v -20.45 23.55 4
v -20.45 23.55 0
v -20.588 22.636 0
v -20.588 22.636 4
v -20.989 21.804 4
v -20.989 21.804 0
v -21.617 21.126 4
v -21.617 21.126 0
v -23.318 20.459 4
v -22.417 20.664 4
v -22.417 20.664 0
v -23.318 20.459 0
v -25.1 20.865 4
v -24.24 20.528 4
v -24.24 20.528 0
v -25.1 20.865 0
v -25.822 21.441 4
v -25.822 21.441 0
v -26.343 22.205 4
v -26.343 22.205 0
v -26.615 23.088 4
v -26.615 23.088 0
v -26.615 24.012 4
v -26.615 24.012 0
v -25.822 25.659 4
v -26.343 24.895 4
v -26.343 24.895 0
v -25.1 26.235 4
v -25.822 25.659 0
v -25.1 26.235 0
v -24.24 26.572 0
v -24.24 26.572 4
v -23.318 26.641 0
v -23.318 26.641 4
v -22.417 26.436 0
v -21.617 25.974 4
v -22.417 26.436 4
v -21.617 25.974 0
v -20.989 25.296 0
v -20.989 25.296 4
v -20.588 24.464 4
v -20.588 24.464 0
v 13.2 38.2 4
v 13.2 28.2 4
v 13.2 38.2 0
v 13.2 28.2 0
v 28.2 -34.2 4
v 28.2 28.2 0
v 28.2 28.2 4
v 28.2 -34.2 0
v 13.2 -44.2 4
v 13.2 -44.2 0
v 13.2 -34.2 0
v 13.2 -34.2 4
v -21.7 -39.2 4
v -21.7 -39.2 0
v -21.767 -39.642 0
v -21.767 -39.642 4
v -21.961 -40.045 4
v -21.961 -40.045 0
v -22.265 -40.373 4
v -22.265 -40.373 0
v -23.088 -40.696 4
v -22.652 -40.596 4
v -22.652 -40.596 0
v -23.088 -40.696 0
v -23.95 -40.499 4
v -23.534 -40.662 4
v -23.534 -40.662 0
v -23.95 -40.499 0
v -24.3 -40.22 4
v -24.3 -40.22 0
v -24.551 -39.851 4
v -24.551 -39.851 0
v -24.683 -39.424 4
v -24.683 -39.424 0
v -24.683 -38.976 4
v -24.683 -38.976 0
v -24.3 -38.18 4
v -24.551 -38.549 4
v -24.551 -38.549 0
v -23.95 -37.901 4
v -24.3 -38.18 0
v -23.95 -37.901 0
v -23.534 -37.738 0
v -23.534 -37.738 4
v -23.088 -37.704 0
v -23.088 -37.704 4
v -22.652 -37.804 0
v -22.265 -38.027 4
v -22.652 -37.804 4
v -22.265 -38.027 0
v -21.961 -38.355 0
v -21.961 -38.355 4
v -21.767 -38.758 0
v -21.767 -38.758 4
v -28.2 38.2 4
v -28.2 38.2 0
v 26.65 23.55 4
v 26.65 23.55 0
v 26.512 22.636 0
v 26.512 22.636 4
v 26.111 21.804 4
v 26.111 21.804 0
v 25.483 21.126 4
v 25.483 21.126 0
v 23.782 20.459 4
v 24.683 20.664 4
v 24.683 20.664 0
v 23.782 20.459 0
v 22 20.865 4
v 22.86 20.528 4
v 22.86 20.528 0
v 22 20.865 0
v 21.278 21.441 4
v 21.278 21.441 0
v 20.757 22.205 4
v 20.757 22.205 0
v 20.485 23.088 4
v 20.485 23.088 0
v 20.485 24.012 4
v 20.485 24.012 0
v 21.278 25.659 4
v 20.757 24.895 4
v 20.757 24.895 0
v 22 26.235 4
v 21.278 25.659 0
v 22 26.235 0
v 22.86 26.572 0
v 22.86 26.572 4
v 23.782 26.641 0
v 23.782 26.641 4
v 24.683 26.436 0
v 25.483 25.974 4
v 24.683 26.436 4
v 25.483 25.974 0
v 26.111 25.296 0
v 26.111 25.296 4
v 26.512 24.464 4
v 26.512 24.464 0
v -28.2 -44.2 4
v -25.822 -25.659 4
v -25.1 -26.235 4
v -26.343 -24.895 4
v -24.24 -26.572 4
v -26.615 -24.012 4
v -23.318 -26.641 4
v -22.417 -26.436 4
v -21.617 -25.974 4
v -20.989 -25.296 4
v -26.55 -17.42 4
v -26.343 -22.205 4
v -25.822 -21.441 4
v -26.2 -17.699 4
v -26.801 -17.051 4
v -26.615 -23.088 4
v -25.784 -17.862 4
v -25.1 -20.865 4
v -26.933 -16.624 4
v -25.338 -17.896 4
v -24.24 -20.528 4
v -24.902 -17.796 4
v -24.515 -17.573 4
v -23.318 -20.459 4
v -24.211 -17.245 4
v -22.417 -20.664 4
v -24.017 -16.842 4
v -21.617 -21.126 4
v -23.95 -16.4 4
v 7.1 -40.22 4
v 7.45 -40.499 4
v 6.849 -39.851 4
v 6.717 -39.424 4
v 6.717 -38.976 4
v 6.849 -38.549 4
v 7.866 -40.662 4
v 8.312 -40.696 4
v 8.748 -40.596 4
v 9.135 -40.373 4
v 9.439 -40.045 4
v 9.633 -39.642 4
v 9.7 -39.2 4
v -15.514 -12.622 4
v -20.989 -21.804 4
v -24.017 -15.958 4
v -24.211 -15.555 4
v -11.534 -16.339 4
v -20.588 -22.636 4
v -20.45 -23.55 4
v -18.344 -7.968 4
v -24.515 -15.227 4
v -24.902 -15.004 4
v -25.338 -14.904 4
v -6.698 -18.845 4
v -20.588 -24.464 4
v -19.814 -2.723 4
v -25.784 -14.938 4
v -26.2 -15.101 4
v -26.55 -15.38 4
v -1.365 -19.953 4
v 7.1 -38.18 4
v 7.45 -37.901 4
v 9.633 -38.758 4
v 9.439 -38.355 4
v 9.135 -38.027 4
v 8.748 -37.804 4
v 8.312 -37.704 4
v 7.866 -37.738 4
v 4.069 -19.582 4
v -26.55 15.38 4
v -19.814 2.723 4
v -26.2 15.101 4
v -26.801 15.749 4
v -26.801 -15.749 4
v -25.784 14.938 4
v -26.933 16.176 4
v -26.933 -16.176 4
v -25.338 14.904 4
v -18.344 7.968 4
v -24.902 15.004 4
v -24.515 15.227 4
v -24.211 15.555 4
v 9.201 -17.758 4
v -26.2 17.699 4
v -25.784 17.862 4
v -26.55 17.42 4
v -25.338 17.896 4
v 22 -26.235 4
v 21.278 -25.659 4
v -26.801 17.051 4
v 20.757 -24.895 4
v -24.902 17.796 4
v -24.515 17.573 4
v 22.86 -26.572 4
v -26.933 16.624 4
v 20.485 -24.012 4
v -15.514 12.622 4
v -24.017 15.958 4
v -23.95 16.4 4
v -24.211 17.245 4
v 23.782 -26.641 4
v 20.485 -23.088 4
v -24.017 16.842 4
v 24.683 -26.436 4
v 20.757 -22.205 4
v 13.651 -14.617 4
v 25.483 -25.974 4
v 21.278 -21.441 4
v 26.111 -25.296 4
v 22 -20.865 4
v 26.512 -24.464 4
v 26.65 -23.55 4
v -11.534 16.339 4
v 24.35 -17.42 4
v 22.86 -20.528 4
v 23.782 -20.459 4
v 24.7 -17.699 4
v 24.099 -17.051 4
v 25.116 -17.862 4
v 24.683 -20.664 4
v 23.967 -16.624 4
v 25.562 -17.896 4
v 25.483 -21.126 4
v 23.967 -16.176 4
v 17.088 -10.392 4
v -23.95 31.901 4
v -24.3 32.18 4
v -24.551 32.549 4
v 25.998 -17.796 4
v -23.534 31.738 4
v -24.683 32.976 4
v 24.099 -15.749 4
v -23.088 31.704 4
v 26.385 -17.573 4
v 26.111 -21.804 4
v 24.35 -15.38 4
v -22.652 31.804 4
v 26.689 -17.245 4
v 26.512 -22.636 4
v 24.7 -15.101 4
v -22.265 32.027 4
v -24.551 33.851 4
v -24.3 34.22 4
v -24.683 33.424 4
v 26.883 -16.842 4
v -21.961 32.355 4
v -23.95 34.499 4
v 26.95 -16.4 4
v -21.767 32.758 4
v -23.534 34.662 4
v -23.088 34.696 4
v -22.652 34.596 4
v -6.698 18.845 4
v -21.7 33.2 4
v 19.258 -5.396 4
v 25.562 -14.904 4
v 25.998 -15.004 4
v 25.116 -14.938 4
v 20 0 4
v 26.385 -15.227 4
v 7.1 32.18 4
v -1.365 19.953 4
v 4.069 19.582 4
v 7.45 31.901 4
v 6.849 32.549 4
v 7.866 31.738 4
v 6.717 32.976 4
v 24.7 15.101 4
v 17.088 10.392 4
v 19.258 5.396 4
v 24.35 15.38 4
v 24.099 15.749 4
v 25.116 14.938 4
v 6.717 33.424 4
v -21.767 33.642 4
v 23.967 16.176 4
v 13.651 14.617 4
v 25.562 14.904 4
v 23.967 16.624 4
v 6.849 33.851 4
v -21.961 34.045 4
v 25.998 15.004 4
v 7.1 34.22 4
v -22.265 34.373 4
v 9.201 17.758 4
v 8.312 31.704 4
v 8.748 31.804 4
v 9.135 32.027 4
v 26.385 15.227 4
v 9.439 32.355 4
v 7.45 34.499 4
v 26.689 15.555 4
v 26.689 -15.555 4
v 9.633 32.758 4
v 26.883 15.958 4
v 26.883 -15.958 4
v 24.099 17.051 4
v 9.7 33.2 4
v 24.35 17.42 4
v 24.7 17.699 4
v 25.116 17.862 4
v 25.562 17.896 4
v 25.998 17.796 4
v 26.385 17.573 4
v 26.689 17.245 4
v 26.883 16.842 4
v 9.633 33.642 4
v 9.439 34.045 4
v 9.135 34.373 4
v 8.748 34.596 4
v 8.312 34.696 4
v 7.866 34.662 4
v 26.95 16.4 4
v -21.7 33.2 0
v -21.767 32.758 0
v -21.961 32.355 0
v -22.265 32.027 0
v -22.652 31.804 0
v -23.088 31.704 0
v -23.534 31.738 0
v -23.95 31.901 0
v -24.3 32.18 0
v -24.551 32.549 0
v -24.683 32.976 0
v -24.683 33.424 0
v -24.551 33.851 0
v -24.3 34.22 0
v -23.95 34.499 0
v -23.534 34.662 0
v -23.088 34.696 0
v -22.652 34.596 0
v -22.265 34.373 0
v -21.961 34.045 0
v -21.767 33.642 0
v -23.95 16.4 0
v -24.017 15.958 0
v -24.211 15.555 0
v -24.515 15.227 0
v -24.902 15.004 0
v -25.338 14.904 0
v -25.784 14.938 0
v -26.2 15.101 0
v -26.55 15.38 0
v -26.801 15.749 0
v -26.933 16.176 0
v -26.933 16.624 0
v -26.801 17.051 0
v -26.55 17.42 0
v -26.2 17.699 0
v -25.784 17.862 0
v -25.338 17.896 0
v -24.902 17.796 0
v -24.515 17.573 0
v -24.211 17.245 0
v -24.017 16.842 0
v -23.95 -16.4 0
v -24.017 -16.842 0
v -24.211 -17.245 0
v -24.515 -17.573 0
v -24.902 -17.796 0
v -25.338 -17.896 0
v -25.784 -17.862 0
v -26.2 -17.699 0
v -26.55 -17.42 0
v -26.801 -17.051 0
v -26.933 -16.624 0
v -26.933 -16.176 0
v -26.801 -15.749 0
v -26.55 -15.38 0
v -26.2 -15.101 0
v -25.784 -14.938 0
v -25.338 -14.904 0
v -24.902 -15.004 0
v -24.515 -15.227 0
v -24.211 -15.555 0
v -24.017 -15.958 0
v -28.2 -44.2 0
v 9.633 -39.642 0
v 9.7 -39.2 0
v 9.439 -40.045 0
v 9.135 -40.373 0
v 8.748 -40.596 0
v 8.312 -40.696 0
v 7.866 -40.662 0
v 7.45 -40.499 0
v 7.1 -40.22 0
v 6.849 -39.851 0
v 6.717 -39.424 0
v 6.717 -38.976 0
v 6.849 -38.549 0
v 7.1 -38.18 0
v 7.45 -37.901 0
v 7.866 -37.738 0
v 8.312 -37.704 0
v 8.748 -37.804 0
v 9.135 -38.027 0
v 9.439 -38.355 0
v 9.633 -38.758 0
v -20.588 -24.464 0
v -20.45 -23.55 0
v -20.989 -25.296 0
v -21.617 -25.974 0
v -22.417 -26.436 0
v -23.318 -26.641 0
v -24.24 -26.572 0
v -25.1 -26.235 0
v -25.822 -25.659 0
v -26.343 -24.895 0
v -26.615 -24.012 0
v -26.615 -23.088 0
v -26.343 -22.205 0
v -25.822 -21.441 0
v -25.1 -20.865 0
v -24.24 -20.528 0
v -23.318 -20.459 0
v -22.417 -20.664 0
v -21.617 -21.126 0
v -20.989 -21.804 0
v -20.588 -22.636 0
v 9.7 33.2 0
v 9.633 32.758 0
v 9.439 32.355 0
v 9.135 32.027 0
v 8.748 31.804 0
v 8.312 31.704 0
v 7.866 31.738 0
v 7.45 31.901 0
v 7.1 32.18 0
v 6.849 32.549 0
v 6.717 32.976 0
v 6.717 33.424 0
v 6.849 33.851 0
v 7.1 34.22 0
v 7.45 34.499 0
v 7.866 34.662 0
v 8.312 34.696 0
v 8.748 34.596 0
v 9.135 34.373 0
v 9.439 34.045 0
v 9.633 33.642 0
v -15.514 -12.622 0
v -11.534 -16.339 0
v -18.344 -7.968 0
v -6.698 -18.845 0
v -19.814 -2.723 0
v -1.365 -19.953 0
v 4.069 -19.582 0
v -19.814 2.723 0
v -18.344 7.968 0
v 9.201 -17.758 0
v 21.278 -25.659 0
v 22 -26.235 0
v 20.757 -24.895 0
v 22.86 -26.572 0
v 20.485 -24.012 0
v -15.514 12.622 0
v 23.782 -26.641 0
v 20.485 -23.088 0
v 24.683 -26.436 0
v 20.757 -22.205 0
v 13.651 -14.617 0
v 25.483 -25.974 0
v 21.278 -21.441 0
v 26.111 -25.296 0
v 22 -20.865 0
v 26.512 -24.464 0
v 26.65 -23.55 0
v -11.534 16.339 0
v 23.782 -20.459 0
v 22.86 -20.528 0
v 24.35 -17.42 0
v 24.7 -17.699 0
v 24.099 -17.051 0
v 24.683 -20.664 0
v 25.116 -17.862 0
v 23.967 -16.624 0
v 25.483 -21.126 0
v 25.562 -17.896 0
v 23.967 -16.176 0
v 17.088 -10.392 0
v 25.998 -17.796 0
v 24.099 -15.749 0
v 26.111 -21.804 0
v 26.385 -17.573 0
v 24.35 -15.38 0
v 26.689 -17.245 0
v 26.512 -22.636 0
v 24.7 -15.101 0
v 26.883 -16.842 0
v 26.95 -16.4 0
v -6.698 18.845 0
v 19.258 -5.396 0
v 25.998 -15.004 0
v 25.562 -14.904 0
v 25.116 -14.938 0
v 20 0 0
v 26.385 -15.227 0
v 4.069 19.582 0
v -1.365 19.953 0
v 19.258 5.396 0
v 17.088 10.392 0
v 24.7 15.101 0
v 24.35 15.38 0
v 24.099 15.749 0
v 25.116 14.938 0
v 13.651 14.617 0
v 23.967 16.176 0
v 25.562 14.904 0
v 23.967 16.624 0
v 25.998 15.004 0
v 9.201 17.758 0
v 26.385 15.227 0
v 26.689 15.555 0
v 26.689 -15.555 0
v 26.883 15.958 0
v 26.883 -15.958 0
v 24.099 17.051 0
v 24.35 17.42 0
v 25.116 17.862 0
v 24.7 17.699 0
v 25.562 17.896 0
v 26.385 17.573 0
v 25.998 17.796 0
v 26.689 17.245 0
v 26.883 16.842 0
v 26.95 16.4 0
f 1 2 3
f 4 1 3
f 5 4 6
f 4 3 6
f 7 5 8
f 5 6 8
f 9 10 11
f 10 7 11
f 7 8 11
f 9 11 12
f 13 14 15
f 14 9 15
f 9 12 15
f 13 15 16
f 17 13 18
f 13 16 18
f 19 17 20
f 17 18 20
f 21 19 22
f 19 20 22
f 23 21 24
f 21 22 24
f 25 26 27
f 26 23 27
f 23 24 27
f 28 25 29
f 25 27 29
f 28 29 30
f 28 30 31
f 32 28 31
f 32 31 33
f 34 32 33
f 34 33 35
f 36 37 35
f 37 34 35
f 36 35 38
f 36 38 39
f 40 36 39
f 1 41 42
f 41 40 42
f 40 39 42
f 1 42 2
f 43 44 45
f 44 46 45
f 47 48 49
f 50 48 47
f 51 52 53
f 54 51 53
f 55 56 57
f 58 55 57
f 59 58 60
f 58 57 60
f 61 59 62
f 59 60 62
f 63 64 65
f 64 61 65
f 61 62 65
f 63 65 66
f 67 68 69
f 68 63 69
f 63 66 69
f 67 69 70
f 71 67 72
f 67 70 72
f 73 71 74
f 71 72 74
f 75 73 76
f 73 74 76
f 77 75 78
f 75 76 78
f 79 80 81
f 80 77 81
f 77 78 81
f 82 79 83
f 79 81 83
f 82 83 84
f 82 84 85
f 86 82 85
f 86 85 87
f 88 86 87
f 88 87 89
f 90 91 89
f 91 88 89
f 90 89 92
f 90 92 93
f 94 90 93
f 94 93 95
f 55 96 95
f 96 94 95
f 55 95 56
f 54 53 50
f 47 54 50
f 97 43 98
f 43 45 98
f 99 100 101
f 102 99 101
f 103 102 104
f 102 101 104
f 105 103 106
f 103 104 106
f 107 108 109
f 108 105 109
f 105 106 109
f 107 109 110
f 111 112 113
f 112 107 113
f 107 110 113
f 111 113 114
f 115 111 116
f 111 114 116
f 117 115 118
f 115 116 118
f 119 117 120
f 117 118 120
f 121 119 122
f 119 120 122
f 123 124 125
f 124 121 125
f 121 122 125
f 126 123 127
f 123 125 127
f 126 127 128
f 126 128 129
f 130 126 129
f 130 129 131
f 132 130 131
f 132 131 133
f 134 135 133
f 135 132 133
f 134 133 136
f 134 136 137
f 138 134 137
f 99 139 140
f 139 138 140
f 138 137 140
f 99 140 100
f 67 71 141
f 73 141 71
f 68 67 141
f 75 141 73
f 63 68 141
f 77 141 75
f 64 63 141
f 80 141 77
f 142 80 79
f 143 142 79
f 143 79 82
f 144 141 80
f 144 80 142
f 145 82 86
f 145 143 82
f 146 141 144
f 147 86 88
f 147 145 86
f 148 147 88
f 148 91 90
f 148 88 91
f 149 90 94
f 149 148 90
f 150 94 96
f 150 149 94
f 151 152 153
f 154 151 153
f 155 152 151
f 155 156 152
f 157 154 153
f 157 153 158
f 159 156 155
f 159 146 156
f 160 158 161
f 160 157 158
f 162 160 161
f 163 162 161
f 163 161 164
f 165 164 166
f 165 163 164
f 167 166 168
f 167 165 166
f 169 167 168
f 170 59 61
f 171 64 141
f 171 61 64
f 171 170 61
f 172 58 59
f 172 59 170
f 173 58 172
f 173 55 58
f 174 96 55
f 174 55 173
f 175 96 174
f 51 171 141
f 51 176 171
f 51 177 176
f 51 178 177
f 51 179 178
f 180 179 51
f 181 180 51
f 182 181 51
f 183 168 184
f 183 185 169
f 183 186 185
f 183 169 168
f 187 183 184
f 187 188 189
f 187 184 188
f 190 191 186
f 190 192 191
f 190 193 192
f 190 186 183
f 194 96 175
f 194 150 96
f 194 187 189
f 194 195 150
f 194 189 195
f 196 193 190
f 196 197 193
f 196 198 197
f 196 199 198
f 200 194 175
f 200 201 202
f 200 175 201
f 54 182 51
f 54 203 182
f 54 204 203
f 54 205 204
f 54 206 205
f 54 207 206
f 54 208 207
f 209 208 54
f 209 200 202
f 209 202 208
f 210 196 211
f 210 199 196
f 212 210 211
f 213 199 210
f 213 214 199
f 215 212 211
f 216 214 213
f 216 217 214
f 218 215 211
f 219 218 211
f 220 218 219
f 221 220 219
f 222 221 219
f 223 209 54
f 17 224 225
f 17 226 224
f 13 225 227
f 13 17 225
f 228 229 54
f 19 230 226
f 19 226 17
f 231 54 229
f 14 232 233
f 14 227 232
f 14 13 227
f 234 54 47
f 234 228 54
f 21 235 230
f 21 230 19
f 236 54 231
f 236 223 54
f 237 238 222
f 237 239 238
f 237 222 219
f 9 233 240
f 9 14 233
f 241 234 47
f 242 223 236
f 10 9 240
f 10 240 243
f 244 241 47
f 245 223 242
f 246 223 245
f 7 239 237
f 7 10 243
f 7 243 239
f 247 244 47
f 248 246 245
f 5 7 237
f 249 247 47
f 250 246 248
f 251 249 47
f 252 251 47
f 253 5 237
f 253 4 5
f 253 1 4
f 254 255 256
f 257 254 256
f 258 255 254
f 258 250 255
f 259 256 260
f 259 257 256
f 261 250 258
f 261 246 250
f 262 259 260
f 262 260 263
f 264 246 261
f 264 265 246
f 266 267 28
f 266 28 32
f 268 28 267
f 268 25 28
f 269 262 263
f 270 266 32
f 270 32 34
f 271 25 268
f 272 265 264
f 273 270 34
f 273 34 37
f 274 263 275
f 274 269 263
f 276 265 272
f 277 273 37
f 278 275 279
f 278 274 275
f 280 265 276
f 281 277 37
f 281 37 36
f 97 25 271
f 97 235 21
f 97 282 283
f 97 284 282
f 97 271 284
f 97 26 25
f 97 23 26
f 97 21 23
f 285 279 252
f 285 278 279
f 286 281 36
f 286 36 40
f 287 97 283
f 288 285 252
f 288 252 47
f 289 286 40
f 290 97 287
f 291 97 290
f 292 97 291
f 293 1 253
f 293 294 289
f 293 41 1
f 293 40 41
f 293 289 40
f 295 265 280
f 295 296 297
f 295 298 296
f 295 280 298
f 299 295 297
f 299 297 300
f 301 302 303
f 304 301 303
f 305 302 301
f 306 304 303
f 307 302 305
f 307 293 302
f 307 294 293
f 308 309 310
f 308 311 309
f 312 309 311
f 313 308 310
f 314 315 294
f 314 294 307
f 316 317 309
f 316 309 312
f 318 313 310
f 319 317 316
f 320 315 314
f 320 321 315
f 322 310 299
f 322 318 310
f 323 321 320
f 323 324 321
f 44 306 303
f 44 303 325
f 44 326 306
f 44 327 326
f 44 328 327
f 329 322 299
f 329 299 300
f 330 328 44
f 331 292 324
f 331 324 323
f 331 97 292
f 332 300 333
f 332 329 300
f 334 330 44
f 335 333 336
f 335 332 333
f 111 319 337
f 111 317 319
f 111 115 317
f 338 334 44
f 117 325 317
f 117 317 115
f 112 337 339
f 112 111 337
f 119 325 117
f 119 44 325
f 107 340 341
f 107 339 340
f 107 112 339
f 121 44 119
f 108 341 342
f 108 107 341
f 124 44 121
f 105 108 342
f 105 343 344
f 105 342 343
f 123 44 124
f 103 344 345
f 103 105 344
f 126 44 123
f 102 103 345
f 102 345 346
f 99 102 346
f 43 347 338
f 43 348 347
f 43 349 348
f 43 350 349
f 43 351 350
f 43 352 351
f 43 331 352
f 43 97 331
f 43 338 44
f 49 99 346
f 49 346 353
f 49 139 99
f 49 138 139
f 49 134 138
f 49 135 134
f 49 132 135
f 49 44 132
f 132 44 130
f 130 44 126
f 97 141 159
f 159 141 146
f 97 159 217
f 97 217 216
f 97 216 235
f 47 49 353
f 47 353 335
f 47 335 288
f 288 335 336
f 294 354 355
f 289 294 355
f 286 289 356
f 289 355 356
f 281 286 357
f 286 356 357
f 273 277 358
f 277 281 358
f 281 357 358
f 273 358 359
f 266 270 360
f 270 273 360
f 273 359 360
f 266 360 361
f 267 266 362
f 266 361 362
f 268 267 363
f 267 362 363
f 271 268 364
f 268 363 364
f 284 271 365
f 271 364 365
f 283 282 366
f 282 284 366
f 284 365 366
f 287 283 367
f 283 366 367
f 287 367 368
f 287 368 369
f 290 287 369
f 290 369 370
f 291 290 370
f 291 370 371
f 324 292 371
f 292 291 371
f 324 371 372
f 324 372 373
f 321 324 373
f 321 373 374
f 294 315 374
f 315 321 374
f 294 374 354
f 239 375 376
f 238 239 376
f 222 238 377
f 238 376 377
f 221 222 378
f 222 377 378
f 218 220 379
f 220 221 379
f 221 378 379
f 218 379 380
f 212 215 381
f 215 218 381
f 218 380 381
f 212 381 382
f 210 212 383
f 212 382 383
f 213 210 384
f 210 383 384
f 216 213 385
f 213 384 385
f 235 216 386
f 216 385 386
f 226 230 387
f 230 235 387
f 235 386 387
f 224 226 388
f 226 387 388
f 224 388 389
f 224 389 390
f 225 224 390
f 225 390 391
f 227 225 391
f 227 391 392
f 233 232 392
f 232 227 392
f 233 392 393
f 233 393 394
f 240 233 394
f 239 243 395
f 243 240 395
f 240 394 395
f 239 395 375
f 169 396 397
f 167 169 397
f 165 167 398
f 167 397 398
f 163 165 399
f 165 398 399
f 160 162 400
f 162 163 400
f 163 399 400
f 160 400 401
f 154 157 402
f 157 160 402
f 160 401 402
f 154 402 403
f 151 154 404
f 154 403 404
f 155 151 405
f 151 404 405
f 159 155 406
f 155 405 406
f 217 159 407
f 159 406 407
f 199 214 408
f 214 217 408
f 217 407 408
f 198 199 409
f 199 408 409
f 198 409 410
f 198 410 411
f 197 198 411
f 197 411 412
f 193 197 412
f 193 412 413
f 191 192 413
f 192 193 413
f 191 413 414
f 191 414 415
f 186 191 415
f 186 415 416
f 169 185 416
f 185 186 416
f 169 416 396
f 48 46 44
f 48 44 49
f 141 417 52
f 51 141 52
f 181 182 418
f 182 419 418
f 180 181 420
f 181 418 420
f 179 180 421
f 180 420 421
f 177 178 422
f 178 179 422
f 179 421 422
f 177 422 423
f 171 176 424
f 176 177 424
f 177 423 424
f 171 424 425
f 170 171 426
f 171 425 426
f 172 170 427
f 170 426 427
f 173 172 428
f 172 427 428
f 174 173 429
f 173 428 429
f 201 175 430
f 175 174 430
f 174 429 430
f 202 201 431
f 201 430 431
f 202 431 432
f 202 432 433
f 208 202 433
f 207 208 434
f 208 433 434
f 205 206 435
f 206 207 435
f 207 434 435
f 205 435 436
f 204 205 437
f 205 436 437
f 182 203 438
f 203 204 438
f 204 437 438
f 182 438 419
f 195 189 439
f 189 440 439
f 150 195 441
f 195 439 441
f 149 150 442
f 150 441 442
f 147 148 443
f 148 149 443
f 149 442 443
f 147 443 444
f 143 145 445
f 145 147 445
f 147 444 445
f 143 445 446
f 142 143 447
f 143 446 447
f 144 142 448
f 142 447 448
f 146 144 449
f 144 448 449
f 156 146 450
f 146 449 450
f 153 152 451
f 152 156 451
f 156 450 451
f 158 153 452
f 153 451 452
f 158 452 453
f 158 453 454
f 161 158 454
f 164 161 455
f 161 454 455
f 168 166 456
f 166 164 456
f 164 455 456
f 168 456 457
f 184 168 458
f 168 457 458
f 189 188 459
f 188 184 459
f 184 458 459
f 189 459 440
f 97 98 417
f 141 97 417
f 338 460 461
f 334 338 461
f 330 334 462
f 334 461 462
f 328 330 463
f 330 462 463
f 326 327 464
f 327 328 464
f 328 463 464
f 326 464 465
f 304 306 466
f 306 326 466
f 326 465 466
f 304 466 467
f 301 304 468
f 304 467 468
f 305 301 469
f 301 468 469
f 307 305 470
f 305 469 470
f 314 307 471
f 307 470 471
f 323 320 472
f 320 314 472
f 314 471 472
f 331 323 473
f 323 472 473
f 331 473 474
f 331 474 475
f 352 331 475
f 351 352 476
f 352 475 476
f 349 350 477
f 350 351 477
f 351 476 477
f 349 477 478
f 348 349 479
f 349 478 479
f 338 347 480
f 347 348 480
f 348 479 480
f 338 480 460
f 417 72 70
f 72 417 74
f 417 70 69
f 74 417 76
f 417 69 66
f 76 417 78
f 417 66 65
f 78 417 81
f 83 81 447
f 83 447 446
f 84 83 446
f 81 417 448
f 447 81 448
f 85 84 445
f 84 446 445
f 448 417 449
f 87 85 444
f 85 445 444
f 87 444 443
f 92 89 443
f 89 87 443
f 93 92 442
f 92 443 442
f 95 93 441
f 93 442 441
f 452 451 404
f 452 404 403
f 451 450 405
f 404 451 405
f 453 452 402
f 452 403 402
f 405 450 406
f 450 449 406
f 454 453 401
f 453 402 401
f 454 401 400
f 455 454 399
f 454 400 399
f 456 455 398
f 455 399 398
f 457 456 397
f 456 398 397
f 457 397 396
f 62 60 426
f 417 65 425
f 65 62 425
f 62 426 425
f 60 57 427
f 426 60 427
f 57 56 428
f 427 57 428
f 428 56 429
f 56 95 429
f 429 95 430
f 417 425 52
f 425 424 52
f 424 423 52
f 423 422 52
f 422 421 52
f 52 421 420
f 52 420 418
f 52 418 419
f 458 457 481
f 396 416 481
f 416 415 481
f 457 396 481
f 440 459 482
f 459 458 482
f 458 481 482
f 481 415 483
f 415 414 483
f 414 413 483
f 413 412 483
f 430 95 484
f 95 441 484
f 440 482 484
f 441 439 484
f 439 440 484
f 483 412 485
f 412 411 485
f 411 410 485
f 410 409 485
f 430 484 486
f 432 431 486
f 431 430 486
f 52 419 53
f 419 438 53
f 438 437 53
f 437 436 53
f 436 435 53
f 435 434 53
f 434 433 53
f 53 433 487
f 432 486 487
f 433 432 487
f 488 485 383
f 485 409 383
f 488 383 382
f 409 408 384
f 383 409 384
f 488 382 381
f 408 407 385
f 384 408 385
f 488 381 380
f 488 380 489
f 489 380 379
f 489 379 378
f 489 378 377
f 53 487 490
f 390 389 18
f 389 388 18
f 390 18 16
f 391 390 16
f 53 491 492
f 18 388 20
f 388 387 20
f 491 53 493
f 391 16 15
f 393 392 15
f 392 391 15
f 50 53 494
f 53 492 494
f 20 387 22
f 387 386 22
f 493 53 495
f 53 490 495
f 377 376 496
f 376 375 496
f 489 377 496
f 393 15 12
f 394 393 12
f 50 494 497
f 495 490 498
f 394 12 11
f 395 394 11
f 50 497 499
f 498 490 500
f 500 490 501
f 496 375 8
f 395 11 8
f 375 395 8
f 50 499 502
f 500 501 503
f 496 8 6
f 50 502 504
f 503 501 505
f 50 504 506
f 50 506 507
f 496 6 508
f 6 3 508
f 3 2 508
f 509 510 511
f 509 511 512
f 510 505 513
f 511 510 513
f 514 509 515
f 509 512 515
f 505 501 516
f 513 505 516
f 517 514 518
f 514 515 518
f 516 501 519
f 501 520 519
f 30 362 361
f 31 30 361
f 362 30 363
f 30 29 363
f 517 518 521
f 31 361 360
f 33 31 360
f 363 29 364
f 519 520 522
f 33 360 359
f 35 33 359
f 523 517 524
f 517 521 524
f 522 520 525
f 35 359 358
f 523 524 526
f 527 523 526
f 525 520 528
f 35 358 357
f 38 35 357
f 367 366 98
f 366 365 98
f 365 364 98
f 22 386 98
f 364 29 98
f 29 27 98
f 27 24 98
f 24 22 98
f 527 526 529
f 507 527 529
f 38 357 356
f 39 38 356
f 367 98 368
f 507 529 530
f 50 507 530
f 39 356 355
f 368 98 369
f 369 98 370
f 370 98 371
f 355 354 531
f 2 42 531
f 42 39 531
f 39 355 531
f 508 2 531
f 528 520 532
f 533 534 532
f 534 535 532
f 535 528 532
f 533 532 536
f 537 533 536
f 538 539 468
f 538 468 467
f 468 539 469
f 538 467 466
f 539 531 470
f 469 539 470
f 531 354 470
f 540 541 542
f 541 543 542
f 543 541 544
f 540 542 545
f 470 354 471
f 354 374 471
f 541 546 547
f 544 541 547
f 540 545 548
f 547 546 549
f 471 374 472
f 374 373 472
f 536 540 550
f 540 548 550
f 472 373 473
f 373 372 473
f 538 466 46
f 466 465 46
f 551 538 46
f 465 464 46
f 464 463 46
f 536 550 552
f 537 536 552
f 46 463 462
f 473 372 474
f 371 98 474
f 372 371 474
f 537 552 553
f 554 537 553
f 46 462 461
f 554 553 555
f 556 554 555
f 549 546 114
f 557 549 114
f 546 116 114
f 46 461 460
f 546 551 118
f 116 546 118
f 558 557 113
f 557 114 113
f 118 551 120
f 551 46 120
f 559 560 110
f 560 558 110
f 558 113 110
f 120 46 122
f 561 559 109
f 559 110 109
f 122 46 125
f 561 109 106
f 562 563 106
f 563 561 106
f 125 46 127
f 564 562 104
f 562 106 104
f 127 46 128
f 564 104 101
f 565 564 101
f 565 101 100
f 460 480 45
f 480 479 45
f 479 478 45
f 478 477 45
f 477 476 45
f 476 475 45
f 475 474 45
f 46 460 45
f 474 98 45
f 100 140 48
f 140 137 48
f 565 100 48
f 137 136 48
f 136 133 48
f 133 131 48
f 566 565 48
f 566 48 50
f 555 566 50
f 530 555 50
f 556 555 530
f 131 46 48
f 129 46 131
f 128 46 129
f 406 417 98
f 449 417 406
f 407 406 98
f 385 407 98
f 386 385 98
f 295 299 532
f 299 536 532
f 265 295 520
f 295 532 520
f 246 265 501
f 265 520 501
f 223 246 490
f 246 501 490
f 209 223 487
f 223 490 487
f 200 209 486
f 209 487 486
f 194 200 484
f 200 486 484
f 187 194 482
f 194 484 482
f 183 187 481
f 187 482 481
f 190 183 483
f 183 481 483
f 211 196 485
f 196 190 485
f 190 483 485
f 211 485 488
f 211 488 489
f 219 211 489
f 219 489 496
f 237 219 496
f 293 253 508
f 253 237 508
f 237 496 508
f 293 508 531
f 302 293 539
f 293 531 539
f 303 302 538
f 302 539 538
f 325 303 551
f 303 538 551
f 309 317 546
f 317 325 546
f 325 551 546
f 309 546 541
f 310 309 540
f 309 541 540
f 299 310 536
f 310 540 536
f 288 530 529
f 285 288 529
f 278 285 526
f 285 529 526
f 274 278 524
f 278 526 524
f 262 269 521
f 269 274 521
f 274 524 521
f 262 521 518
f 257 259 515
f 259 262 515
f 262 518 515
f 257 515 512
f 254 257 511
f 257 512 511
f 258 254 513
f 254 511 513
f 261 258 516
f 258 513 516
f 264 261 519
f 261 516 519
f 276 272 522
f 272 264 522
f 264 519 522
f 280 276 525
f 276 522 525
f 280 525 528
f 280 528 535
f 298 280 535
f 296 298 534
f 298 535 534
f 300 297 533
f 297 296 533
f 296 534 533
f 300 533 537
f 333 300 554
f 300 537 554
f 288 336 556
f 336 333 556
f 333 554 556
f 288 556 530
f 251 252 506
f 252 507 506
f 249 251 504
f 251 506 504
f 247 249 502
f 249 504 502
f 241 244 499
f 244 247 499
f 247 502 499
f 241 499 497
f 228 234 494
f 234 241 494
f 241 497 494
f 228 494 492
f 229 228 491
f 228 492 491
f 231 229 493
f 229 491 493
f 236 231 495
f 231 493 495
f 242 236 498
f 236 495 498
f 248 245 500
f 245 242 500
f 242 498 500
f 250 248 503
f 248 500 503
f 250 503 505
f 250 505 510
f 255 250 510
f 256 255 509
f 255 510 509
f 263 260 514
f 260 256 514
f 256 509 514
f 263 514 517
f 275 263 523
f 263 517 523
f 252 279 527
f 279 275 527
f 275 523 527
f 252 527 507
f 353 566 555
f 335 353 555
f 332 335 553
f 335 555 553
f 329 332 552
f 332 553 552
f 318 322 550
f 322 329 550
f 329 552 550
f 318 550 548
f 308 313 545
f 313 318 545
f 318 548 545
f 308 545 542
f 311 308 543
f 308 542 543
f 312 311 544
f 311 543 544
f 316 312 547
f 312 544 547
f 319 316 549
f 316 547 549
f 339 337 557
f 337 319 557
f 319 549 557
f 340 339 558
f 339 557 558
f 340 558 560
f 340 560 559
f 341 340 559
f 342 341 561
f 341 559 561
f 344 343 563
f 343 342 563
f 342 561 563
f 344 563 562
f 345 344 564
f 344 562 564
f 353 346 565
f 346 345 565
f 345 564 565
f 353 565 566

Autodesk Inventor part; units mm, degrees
ref_plane "YZ Plane" through (0, 0, 0) normal (1, 0, 0) x (0, 1, 0)
ref_plane "XZ Plane" through (0, 0, 0) normal (0, 1, 0) x (-1, 0, 0)
ref_plane "XY Plane" through (0, 0, 0) normal (0, 0, 1) x (1, 0, 0)
sketch "Sketch1" plane through (0, 0, 0) normal (0, 0, 1) x (1, 0, 0)
  line L0 (-28.2, 28.2) -> (28.2, 28.2)
  line L1 (28.2, 28.2) -> (28.2, -28.2)
  line L2 (28.2, -28.2) -> (-28.2, -28.2)
  line L3 (-28.2, -28.2) -> (-28.2, 28.2)
  line L4 (-28.2, 28.2) -> (28.2, -28.2) construction
  line L5 (28.2, 28.2) -> (-28.2, -28.2) construction
  circle A0 centre (25.45, 16.4) radius 1.5
  circle A1 centre (25.45, -16.4) radius 1.5
  line L6 (0, 0) -> (0, 28.2) construction
  circle A2 centre (-25.45, 16.4) radius 1.5
  circle A3 centre (-25.45, -16.4) radius 1.5
  circle A4 centre (23.55, 23.55) radius 3.1
  circle A5 centre (-23.55, 23.55) radius 3.1
  circle A6 centre (-23.55, -23.55) radius 3.1
  circle A7 centre (23.55, -23.55) radius 3.1
  circle A8 centre (0, 0) radius 20
  line L7 (-28.2, 28.2) -> (13.2, 28.2)
  line L8 (13.2, 28.2) -> (13.2, 38.2)
  line L9 (13.2, 38.2) -> (-28.2, 38.2)
  line L10 (-28.2, 38.2) -> (-28.2, 28.2)
  circle A9 centre (-23.2, 33.2) radius 1.5
  circle A10 centre (8.2, 33.2) radius 1.5
  line L11 (13.2, -28.2) -> (-28.2, -28.2)
  line L12 (-28.2, -28.2) -> (-28.2, -44.2)
  line L13 (-28.2, -44.2) -> (13.2, -44.2)
  line L14 (13.2, -44.2) -> (13.2, -28.2)
  circle A11 centre (-23.2, -39.2) radius 1.5
  circle A12 centre (8.2, -39.2) radius 1.5
  line L15 (28.2, -28.2) -> (13.2, -28.2)
  line L16 (13.2, -28.2) -> (13.2, -34.2)
  line L17 (13.2, -34.2) -> (28.2, -34.2)
  line L18 (28.2, -34.2) -> (28.2, -28.2)
  point P0 (-28.2, -28.2)
  dimension "d0" = 3
  dimension "d1" = 56.4
  dimension "d2" = 16.4
  dimension "d3" = 25.45
  dimension "d4" = 56.4
  dimension "d5" = 3
  dimension "d6" = 16.4
  dimension "d7" = 25.45
  dimension "d8" = 6.2
  dimension "d9" = 23.55
  dimension "d10" = 23.55
  dimension "d13" = 360
  dimension "d17" = 40
  dimension "d18" = 10
  dimension "d19" = 15
  dimension "d20" = 3
  dimension "d21" = 3
  dimension "d22" = 5
  dimension "d23" = 5
  dimension "d24" = 5
  dimension "d25" = 5
  dimension "d26" = 16
  dimension "d27" = 15
  dimension "d28" = 0
  dimension "d29" = 3
  dimension "d30" = 3
  dimension "d31" = 5
  dimension "d32" = 5
  dimension "d33" = 5
  dimension "d34" = 5
  dimension "d35" = 6
extrude "Extrusion1" add sketch "Sketch1" along normal blind 4
sketch "Sketch3" plane through (0, 0, 4) normal (0, 0, 1) x (1, 0, 0)
  line L0 (28.2, -34.2) -> (28.2, 28.2) projected
  line L1 (28.2, 28.2) -> (13.2, 28.2) projected
  line L2 (13.2, 28.2) -> (13.2, 38.2) projected
  line L3 (13.2, 38.2) -> (-28.2, 38.2) projected
  line L4 (-28.2, 38.2) -> (-28.2, -44.2) projected
  line L5 (-28.2, -44.2) -> (13.2, -44.2) projected
  line L6 (13.2, -44.2) -> (13.2, -34.2) projected
  line L7 (13.2, -34.2) -> (28.2, -34.2) projected
  circle A0 centre (0, 0) radius 20 projected
  circle A1 centre (25.45, 16.4) radius 1.5 projected
  circle A2 centre (25.45, -16.4) radius 1.5 projected
  circle A3 centre (-25.45, 16.4) radius 1.5 projected
  circle A4 centre (-25.45, -16.4) radius 1.5 projected
  circle A5 centre (23.55, 23.55) radius 3.1 projected
  circle A6 centre (-23.55, 23.55) radius 3.1 projected
  circle A7 centre (-23.55, -23.55) radius 3.1 projected
  circle A8 centre (23.55, -23.55) radius 3.1 projected
  circle A9 centre (-23.2, 33.2) radius 1.5 projected
  circle A10 centre (8.2, 33.2) radius 1.5 projected
  circle A11 centre (-23.2, -39.2) radius 1.5 projected
  circle A12 centre (8.2, -39.2) radius 1.5 projected
equation "\"d4\" = d1"
equation "\"d6\" = d2"
equation "\"d7\" = d3"
properties part number "MotorHolder_3D" material "Aluminum 6061, Welded"
